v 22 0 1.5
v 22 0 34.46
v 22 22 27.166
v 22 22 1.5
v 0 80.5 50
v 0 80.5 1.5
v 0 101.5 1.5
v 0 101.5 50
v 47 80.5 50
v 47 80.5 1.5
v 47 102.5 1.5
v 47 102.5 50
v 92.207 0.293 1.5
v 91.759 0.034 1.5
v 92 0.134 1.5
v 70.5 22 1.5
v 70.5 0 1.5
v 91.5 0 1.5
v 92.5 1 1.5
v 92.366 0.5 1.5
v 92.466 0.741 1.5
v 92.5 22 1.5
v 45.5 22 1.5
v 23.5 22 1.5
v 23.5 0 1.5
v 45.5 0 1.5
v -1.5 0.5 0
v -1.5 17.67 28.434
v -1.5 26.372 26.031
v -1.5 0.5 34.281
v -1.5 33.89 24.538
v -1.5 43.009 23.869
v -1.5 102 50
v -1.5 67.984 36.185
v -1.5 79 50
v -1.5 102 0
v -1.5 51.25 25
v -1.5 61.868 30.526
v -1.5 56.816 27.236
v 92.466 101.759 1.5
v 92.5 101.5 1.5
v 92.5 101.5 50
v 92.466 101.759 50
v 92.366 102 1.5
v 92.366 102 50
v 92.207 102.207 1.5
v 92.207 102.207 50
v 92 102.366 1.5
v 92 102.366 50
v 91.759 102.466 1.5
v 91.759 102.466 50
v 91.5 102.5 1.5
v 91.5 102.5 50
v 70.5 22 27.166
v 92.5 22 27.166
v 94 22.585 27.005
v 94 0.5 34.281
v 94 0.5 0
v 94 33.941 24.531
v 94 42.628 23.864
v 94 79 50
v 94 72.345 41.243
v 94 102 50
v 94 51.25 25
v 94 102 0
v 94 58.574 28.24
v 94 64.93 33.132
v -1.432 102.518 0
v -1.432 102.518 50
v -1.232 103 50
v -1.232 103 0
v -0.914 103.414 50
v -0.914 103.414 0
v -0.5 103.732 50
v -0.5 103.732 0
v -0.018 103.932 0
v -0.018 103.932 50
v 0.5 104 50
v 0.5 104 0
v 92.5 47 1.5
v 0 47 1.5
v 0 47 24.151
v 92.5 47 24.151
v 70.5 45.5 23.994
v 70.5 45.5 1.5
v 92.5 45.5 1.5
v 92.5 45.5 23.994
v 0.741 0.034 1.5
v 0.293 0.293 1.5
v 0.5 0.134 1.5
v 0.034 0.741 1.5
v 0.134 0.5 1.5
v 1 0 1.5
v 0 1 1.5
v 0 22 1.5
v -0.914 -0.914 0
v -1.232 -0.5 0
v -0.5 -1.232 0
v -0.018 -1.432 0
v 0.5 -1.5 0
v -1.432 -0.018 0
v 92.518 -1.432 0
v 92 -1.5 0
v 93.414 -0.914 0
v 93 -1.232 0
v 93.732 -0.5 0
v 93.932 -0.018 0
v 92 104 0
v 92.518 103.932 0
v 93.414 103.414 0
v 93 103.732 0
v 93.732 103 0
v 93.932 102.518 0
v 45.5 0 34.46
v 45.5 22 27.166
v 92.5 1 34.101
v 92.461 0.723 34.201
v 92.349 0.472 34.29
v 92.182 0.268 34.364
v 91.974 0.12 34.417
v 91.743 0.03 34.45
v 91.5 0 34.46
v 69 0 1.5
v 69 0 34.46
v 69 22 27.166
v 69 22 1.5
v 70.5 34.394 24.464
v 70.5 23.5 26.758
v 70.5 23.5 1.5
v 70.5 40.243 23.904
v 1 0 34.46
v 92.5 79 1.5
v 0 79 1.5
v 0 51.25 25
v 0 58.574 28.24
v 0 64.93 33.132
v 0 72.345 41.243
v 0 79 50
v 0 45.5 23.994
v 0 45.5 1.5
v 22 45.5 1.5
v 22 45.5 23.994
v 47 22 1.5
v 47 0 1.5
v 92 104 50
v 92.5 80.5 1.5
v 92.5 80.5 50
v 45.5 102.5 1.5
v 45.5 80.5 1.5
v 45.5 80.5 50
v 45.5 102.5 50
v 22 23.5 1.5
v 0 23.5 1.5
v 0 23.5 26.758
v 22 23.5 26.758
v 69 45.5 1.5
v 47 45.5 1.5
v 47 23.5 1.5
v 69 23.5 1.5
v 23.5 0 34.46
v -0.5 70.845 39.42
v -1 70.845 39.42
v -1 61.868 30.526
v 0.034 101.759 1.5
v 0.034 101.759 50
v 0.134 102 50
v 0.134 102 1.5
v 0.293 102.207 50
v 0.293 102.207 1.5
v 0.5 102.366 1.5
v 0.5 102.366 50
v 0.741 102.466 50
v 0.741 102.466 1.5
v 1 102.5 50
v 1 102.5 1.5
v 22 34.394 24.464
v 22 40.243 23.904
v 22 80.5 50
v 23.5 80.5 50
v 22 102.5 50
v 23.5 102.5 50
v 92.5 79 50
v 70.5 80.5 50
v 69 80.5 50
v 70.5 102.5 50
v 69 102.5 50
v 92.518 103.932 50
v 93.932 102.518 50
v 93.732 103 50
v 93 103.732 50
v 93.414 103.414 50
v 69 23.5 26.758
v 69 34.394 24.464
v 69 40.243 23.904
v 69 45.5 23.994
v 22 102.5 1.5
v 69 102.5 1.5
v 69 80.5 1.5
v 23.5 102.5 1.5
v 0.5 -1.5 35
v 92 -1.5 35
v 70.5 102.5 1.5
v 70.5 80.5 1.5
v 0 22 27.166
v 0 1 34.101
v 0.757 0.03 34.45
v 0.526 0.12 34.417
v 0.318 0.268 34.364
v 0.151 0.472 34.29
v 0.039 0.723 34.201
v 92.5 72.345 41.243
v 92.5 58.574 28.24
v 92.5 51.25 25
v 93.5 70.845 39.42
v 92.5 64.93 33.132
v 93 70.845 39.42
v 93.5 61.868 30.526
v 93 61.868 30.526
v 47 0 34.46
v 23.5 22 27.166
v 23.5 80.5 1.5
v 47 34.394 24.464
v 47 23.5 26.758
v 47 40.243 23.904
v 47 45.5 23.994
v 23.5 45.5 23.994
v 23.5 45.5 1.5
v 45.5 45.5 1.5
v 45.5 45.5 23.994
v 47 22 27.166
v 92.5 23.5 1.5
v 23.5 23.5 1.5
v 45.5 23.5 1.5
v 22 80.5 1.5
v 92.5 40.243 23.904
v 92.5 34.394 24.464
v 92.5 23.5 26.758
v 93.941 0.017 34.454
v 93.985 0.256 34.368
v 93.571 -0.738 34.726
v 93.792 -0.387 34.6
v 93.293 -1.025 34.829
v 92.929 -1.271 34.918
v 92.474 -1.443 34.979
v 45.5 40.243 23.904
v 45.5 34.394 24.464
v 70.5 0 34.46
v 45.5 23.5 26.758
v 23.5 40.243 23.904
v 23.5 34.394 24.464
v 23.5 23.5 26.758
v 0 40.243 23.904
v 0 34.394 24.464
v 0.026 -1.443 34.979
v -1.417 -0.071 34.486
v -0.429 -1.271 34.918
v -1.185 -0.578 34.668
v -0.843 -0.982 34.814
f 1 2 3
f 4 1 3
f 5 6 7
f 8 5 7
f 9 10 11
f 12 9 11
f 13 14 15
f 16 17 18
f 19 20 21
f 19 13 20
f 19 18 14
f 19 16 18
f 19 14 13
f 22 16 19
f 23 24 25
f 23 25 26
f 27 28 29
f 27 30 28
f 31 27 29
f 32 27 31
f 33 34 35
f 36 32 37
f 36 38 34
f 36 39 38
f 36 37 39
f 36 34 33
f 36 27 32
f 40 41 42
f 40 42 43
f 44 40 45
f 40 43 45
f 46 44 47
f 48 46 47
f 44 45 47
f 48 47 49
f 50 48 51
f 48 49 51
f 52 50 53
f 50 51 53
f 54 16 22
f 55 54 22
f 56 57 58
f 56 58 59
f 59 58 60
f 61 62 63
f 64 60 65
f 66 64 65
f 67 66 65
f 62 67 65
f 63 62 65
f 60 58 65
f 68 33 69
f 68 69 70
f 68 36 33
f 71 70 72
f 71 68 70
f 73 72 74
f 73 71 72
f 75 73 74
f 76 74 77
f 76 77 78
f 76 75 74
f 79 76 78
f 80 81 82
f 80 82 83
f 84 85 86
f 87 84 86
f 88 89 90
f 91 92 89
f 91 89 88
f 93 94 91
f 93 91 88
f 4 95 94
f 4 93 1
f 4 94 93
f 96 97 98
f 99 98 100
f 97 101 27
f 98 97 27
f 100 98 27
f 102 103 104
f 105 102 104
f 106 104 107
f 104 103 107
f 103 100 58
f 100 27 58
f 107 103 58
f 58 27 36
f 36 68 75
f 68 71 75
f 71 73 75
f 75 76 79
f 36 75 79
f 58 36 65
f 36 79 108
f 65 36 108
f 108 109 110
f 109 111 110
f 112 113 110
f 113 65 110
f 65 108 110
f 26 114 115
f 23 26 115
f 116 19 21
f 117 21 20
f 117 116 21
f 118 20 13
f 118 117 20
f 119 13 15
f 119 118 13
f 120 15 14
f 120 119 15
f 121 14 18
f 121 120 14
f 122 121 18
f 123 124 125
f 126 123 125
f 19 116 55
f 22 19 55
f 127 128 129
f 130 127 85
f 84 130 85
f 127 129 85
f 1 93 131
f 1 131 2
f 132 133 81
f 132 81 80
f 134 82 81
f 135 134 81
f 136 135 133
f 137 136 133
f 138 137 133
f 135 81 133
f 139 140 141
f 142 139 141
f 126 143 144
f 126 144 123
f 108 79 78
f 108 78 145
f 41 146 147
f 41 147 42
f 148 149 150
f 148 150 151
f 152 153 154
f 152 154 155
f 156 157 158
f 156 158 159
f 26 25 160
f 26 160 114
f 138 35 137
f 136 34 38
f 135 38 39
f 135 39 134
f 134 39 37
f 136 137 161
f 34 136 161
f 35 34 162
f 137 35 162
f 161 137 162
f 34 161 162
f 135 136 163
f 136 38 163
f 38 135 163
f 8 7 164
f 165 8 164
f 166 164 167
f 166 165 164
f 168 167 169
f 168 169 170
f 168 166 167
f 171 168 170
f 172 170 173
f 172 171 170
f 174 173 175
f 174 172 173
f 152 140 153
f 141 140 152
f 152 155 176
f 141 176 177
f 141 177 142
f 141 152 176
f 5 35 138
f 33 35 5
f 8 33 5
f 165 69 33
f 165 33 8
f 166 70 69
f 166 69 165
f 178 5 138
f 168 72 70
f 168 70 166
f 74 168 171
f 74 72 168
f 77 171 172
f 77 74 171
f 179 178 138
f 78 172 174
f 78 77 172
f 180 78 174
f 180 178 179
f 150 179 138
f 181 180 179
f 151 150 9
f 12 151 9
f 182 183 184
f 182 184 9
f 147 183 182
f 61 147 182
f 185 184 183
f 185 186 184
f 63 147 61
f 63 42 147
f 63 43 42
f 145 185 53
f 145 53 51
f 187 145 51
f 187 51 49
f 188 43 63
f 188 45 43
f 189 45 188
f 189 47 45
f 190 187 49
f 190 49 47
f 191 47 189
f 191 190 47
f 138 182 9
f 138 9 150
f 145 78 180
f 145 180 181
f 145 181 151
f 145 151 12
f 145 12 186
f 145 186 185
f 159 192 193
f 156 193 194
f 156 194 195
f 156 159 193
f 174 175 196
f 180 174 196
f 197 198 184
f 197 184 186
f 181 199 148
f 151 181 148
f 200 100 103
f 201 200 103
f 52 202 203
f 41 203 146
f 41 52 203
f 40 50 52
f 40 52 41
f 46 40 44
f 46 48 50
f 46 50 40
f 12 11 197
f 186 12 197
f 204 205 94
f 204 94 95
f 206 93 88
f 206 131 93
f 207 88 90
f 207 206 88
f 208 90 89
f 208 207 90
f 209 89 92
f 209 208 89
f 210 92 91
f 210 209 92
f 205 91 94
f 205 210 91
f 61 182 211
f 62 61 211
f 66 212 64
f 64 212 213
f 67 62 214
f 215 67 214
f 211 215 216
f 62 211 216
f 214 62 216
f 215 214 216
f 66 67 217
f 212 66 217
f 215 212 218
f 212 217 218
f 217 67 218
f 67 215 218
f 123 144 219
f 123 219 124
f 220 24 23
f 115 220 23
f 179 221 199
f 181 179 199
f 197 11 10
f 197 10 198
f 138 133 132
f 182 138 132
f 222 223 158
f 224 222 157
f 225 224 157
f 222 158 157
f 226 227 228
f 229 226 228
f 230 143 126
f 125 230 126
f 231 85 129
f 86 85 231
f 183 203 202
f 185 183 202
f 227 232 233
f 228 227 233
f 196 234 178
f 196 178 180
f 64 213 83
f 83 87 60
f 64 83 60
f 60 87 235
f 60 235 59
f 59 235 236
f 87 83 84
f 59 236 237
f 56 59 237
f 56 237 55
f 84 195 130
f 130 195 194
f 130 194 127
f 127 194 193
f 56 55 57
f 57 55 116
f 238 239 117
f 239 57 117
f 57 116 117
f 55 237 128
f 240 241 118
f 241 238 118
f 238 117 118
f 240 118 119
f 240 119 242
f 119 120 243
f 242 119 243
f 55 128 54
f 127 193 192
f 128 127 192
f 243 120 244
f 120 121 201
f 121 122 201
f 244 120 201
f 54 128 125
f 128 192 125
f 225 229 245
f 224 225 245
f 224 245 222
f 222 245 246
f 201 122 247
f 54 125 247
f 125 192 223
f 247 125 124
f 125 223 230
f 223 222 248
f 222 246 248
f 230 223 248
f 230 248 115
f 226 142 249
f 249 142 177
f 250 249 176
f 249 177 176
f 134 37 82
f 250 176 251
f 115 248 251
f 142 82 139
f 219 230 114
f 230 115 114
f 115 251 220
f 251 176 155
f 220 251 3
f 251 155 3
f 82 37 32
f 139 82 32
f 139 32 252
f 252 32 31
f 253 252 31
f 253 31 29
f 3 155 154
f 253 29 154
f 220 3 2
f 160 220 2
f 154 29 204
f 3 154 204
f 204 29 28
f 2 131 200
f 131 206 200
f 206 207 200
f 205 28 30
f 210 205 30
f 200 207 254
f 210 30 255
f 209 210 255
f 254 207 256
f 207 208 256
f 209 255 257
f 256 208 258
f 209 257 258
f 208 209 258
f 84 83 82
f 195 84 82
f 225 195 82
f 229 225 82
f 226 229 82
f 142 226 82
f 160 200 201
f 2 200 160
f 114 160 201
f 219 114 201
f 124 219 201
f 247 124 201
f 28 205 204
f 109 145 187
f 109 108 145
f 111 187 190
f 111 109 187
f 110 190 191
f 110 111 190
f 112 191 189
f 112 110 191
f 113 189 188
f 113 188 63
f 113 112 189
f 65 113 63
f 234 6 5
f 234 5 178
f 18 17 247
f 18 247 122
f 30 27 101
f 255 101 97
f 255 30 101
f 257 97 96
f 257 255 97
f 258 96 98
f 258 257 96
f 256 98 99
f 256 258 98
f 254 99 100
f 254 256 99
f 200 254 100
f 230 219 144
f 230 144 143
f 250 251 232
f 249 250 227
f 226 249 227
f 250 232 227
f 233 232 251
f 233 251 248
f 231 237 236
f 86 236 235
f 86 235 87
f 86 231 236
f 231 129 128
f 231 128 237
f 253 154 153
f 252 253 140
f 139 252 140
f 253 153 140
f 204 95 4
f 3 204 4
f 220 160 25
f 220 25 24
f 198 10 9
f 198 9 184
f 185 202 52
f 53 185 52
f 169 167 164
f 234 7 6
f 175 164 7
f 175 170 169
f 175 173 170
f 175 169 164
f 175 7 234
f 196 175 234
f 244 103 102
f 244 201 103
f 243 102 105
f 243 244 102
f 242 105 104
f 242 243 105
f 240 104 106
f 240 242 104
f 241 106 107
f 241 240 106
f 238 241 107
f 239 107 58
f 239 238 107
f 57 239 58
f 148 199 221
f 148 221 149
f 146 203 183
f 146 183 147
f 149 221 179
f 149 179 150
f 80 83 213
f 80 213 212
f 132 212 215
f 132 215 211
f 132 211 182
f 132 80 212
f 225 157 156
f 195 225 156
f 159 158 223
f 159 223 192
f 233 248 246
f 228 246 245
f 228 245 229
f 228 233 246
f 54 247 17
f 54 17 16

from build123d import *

# Parameters (mm, degrees)
F0_W     = 95.5
F0_H     = 105.5
F0_W_2   = 22
F0_H_2   = 22
F0_W_3   = 92.5
F0_H_3   = 32
F1_DEPTH = 50
F2_W     = 95.5
F2_H     = 105.5
F3_DEPTH = 1.5
F5_DEPTH = 100
F6_R     = 2
F7_R     = 1


with BuildPart() as f1:
    # F0 (on Top) → F1 (new body)
    with BuildSketch(Plane.XY):
        with Locations((46.25, 51.25)):
            Rectangle(F0_W, F0_H)
        with Locations((11, 11)):
            Rectangle(F0_W_2, F0_H_2, mode=Mode.SUBTRACT)
        with Locations((34.5, 11)):
            Rectangle(F0_W_2, F0_H_2, mode=Mode.SUBTRACT)
        with Locations((11, 34.5)):
            Rectangle(F0_W_2, F0_H_2, mode=Mode.SUBTRACT)
        with Locations((34.5, 34.5)):
            Rectangle(F0_W_2, F0_H_2, mode=Mode.SUBTRACT)
        with Locations((58, 11)):
            Rectangle(F0_W_2, F0_H_2, mode=Mode.SUBTRACT)
        with Locations((81.5, 11)):
            Rectangle(F0_W_2, F0_H_2, mode=Mode.SUBTRACT)
        with Locations((58, 34.5)):
            Rectangle(F0_W_2, F0_H_2, mode=Mode.SUBTRACT)
        with Locations((81.5, 34.5)):
            Rectangle(F0_W_2, F0_H_2, mode=Mode.SUBTRACT)
        with Locations((11, 91.5)):
            Rectangle(F0_W_2, F0_H_2, mode=Mode.SUBTRACT)
        with Locations((34.5, 91.5)):
            Rectangle(F0_W_2, F0_H_2, mode=Mode.SUBTRACT)
        with Locations((46.25, 63)):
            Rectangle(F0_W_3, F0_H_3, mode=Mode.SUBTRACT)
        with Locations((58, 91.5)):
            Rectangle(F0_W_2, F0_H_2, mode=Mode.SUBTRACT)
        with Locations((81.5, 91.5)):
            Rectangle(F0_W_2, F0_H_2, mode=Mode.SUBTRACT)
    extrude(amount=F1_DEPTH)

    # F2 (on Top) → F3 (join)
    with BuildSketch(Plane.XY):
        with Locations((46.25, 51.25)):
            Rectangle(F2_W, F2_H)
    extrude(amount=F3_DEPTH)

    # F4 (on face) → F5 (cut)
    with BuildSketch(Plane(origin=(-1.5, 0, 0), x_dir=(0, -1, 0), z_dir=(-1, 0, 0))):
        with BuildLine():
            Line((1.5, 50), (-79, 50))
            add(Edge.make_bspline(
                [(-79, 50), (-70.9814525391, 39.139632946), (-62.9629050781, 28.2792658921), (-51.25, 25)],
                knots=[0, 0, 0, 0, 0.4547652437, 0.4547652437, 0.4547652437, 0.4547652437], degree=3))
            add(Edge.make_bspline(
                [(-51.25, 25), (-37.2069678319, 21.0683676592), (-17.853483916, 28.0341838296), (1.5, 35)],
                knots=[0.4547652437, 0.4547652437, 0.4547652437, 0.4547652437, 1, 1, 1, 1], degree=3))
            Line((1.5, 35), (1.5, 50))
        make_face()
    extrude(amount=-F5_DEPTH, mode=Mode.SUBTRACT)

    # F6
    f6_edges = [f1.edges().sort_by_distance(p)[0] for p in [
        (94, -1.5, 17.5),
        (94, 104, 25),
        (-1.5, -1.5, 17.5),
        (-1.5, 104, 25),
    ]]
    fillet(f6_edges, radius=F6_R)

    # F7
    f7_edges = [f1.edges().sort_by_distance(p)[0] for p in [
        (0, 0, 17.980133),
        (92.5, 0, 17.980133),
        (92.5, 102.5, 25.75),
        (0, 102.5, 25.75),
    ]]
    fillet(f7_edges, radius=F7_R)


solid = f1.part
